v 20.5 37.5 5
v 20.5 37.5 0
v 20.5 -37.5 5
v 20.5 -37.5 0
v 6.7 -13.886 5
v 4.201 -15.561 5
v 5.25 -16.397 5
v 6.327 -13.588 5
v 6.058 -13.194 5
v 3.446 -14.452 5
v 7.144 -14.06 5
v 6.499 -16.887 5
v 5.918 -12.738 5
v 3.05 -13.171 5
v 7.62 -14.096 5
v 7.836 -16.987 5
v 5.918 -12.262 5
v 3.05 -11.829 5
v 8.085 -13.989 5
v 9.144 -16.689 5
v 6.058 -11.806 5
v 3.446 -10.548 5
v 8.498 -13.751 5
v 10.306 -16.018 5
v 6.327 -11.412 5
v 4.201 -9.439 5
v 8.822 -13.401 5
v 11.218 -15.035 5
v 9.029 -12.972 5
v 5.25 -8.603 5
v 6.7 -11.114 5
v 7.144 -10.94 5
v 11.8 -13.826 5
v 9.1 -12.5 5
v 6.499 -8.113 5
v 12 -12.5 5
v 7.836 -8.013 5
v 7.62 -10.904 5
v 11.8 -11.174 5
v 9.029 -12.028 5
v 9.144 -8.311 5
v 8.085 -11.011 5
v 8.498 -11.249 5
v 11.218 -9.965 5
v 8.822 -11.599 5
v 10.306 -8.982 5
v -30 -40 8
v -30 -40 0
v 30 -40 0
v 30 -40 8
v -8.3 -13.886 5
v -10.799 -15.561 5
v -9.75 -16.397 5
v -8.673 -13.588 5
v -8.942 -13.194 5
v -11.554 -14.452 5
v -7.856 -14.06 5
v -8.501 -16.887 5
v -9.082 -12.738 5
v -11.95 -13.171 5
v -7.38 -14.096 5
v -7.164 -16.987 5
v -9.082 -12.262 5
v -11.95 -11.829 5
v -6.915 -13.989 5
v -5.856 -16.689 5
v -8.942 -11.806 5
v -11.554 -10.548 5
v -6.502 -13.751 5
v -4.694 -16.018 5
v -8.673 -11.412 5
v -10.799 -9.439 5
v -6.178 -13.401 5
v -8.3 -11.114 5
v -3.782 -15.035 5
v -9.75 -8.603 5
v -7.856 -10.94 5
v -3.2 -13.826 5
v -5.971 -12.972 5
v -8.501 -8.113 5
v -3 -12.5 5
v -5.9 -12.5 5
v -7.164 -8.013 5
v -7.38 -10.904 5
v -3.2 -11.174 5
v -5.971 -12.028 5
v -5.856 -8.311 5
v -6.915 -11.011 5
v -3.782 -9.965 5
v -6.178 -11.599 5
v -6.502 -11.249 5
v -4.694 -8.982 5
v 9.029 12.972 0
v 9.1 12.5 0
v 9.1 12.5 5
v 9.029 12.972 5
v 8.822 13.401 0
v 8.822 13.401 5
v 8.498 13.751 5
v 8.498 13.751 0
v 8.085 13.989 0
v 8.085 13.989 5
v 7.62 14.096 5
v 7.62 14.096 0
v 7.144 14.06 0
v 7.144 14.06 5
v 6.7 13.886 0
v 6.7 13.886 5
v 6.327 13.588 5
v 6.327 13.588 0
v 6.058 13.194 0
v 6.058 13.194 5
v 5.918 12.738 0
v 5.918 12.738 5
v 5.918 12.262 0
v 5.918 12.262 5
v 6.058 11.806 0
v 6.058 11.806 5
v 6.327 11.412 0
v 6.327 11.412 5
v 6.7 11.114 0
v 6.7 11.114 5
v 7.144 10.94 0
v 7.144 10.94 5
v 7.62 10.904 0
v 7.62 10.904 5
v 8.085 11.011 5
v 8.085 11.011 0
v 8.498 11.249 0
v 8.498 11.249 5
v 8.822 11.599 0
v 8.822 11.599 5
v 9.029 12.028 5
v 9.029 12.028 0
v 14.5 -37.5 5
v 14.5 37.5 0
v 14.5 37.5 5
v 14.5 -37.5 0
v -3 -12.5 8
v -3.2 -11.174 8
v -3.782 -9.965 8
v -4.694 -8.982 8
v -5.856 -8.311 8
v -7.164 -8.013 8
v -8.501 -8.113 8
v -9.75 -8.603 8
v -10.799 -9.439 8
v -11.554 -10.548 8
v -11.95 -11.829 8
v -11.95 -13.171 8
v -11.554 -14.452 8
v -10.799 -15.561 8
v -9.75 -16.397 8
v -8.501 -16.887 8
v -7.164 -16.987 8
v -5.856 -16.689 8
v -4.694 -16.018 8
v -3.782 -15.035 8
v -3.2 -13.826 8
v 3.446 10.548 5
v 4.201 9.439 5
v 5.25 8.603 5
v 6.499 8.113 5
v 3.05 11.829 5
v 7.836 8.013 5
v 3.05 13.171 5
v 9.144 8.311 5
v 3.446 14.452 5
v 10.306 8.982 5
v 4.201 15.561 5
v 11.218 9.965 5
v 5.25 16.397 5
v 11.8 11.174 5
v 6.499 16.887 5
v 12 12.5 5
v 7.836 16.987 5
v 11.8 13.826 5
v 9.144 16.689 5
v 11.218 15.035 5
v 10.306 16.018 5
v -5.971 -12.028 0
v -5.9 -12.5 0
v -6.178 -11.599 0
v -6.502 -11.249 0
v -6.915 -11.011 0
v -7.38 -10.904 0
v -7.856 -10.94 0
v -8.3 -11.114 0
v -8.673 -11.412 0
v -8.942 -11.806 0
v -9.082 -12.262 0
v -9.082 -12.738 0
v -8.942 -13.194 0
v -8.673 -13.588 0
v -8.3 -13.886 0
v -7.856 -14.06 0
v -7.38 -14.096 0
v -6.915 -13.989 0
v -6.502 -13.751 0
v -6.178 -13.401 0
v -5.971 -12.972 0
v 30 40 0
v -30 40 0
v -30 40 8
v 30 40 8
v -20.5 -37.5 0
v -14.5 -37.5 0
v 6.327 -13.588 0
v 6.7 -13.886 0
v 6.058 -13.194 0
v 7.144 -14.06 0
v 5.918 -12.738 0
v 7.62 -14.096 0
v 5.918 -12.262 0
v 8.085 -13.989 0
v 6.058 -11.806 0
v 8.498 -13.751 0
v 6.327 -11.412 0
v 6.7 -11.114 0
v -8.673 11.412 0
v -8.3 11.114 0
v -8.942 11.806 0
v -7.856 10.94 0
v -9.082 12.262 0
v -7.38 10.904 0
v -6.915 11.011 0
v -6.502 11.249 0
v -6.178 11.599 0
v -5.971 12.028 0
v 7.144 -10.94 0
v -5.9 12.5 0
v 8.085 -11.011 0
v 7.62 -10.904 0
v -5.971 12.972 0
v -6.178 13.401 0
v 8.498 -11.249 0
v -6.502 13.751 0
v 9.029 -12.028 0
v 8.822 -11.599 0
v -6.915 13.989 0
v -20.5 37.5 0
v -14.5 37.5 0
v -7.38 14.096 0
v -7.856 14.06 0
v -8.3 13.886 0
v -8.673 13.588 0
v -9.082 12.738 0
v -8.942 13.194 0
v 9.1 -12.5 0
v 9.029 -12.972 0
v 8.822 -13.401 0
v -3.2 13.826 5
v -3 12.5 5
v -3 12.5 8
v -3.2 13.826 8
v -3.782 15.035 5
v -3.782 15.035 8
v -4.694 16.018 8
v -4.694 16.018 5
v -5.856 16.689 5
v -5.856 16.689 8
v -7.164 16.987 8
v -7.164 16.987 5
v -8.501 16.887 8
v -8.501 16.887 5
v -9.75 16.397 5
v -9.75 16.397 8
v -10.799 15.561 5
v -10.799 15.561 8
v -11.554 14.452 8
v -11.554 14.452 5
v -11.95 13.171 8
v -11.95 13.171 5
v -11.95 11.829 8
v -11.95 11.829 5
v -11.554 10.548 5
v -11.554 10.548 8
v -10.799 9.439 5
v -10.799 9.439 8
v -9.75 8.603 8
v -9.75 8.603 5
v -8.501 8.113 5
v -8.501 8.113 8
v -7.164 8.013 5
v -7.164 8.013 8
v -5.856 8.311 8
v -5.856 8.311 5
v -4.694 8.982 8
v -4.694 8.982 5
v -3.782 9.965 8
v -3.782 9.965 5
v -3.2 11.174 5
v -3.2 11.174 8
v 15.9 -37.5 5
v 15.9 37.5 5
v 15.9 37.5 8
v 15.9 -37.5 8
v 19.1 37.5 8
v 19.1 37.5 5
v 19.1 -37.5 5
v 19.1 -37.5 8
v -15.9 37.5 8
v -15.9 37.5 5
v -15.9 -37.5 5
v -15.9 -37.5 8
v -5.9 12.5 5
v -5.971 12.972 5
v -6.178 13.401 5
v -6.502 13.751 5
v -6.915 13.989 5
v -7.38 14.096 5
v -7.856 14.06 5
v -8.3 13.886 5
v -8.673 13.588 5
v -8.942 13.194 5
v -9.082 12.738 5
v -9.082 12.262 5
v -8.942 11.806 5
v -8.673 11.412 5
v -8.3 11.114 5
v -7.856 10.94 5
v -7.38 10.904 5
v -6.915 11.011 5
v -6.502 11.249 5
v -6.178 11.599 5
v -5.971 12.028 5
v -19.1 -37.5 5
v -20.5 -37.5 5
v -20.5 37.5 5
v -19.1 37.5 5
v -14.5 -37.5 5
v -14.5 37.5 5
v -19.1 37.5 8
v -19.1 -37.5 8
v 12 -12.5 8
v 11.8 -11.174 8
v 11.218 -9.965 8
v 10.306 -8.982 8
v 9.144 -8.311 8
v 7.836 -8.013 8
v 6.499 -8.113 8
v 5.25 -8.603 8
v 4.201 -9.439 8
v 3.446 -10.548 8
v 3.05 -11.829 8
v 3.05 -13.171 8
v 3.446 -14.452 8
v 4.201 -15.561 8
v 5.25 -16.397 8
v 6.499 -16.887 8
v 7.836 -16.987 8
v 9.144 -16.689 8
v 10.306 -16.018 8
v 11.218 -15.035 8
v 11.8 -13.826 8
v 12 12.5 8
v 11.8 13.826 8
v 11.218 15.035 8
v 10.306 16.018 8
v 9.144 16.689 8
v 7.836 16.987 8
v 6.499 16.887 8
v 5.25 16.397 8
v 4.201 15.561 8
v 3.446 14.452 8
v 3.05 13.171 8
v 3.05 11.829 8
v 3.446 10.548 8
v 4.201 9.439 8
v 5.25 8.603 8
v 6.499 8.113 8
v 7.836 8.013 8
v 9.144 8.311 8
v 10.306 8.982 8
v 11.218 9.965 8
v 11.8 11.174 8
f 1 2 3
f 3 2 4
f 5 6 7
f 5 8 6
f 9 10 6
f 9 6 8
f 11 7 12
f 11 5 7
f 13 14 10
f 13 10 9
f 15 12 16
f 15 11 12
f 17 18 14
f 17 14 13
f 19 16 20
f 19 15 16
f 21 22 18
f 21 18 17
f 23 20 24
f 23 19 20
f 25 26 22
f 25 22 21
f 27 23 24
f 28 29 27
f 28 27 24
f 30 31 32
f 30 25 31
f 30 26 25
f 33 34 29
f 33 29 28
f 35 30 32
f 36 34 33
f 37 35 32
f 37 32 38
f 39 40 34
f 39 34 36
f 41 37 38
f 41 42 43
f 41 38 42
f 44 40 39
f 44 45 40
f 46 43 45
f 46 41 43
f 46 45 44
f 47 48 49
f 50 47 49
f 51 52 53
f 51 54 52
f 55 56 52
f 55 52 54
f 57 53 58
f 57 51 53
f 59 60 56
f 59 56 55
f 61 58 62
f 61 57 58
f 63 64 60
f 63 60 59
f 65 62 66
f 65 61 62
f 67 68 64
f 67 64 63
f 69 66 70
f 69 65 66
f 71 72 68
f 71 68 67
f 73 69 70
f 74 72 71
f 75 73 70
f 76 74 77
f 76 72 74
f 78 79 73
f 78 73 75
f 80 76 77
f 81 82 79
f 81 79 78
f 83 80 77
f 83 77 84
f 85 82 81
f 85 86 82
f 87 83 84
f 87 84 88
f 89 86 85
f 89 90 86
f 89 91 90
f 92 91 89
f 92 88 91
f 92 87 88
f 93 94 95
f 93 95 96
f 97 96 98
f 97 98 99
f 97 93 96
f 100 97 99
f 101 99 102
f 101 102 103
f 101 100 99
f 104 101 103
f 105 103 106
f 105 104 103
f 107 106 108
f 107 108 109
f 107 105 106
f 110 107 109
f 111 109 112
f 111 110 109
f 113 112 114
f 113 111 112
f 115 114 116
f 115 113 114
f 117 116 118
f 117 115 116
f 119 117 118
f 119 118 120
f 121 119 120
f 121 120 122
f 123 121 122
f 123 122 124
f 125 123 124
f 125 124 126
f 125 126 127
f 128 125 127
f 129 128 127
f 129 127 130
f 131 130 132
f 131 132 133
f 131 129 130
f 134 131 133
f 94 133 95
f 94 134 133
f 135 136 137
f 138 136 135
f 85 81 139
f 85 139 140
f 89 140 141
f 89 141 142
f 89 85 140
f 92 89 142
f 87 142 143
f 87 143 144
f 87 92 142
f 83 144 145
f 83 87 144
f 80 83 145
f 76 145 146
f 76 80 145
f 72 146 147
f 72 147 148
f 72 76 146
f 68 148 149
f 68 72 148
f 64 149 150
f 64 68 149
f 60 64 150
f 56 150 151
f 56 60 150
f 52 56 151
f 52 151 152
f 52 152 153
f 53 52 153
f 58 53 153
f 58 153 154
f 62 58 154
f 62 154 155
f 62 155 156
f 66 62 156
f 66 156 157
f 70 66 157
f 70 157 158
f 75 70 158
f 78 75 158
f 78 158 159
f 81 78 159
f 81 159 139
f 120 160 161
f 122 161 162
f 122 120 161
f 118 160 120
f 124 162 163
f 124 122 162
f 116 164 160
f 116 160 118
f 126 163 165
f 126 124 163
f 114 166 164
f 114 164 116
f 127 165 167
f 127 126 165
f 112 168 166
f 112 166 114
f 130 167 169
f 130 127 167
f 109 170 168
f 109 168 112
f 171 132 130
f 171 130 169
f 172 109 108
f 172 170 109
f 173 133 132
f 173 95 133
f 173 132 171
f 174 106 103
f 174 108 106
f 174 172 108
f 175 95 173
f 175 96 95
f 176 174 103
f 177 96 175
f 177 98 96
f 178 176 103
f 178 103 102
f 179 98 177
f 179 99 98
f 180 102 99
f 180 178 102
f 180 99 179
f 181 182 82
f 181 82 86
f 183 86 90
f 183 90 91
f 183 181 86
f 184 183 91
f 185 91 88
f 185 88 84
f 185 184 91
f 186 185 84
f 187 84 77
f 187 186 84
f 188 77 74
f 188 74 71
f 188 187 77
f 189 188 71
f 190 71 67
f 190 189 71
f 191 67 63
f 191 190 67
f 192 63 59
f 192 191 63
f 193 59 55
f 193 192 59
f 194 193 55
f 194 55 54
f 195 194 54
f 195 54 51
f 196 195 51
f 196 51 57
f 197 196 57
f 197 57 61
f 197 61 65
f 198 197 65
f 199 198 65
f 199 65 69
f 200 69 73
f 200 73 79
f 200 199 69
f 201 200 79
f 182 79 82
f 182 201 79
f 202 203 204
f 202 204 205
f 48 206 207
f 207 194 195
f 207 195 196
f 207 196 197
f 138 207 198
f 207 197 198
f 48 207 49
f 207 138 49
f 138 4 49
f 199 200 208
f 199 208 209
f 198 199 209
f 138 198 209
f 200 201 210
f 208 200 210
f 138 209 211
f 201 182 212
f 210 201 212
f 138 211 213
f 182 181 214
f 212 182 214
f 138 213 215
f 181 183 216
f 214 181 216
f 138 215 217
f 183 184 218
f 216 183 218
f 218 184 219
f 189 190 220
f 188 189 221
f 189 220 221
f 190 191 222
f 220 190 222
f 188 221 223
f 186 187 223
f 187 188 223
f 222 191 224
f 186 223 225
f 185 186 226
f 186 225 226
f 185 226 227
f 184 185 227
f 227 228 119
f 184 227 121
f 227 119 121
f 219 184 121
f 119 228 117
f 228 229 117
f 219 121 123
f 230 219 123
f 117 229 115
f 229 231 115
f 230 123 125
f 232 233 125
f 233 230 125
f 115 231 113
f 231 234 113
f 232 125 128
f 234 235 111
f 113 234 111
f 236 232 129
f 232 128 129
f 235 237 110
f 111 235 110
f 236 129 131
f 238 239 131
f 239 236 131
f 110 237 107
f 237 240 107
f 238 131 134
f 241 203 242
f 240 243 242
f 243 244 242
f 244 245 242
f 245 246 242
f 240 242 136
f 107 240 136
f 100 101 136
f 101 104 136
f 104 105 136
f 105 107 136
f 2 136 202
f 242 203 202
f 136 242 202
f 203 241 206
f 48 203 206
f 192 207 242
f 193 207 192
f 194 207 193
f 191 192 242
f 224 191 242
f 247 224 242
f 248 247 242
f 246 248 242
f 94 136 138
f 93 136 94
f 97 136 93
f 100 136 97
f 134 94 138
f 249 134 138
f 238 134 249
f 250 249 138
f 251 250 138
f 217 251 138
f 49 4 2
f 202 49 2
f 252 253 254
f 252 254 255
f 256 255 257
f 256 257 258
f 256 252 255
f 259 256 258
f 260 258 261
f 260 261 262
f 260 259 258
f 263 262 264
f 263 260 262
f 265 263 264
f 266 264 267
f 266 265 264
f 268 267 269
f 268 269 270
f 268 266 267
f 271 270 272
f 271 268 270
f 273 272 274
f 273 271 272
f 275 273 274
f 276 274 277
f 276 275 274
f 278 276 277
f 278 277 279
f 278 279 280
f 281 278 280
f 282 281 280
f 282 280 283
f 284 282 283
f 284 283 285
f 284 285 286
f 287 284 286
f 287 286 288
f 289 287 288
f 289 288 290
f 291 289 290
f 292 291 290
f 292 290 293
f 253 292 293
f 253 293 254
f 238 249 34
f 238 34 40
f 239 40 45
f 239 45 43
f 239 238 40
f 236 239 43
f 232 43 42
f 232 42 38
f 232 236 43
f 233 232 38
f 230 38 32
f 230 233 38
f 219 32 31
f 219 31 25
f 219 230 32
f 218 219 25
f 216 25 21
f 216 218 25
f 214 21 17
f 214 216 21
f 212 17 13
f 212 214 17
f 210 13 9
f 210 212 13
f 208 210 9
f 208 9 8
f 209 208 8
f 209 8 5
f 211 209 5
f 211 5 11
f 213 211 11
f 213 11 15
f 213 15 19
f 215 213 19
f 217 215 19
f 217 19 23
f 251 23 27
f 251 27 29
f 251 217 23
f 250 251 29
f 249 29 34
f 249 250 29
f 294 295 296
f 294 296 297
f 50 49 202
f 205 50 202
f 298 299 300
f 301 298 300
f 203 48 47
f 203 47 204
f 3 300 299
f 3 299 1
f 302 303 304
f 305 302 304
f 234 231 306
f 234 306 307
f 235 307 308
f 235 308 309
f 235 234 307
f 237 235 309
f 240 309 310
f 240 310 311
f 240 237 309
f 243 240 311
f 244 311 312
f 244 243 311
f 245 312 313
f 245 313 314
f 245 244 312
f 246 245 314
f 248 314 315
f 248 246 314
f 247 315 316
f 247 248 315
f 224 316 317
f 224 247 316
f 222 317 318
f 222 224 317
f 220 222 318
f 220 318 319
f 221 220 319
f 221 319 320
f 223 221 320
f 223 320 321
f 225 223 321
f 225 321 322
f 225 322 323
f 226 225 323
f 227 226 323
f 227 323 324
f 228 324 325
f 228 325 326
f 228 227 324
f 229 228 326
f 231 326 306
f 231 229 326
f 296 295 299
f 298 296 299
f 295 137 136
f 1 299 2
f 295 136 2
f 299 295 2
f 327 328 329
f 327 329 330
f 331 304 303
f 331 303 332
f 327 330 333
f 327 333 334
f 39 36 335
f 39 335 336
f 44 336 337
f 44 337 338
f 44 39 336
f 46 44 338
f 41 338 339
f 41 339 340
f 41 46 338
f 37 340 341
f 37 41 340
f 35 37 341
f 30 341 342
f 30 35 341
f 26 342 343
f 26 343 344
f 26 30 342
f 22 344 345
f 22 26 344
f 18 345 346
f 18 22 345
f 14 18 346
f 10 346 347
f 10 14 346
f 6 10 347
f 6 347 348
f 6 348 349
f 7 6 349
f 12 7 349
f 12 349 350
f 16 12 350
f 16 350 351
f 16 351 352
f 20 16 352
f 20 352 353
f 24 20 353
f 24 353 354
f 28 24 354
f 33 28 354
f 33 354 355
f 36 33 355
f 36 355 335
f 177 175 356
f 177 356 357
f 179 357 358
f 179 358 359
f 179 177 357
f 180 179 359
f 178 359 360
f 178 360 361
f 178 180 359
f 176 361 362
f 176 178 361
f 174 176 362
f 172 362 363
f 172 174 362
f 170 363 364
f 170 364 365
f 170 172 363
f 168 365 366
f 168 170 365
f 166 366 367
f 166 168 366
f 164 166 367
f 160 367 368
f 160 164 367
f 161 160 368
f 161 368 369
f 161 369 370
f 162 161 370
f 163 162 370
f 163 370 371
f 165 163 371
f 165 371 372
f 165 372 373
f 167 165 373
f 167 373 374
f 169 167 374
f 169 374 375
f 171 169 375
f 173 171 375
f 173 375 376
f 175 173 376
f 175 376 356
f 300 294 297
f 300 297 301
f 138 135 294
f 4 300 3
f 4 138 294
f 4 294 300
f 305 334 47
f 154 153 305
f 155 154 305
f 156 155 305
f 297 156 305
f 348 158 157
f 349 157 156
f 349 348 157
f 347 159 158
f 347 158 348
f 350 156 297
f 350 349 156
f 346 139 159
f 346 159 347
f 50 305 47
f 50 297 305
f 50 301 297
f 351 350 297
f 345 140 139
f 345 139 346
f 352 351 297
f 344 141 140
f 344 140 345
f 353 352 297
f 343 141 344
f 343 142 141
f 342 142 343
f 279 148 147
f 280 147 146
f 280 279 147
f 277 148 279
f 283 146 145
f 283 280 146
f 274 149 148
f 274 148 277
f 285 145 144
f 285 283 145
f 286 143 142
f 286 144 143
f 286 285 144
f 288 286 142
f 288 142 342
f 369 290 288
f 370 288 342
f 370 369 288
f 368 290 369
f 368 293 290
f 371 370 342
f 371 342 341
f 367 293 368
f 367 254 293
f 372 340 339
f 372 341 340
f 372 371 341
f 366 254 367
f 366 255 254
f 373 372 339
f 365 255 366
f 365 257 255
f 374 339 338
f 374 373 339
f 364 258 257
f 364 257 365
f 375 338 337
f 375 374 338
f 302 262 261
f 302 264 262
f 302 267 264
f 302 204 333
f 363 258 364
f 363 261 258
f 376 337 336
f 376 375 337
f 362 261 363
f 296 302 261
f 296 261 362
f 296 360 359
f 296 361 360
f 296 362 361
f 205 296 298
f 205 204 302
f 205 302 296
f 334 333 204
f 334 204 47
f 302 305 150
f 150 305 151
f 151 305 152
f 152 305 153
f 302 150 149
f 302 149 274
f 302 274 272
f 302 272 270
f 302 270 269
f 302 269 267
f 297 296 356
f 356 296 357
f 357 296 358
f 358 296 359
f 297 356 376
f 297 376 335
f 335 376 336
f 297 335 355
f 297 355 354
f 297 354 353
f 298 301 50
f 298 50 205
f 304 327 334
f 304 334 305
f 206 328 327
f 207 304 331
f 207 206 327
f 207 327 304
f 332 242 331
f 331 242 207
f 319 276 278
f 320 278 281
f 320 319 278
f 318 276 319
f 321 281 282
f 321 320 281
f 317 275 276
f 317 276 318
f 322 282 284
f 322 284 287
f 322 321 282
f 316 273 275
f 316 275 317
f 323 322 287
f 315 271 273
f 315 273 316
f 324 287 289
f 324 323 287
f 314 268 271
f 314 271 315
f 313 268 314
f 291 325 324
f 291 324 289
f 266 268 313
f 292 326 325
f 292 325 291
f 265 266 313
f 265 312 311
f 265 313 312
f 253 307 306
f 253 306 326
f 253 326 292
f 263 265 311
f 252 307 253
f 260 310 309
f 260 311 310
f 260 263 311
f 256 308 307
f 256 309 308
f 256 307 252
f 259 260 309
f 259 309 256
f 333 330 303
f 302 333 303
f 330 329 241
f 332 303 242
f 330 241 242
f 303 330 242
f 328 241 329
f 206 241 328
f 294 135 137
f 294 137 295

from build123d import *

# Parameters (mm, degrees)
F0_W     = 60
F0_H     = 80
F0_R     = 4.5
F1_DEPTH = 8
F0_R_2   = 1.6
F2_DEPTH = 5
F3_W     = 1.4
F3_H     = 75
F4_DEPTH = 5
F3_W_2   = 1.6
F3_W_3   = 3.2
F5_DEPTH = 25


with BuildPart() as f1:
    # F0 (on Top) → F1 (new body)
    with BuildSketch(Plane.XY):
        Rectangle(F0_W, F0_H)
        with Locations((-7.5, -12.5)):
            Circle(F0_R, mode=Mode.SUBTRACT)
        with Locations((7.5, -12.5)):
            Circle(F0_R, mode=Mode.SUBTRACT)
        with Locations((-7.5, 12.5)):
            Circle(F0_R, mode=Mode.SUBTRACT)
        with Locations((7.5, 12.5)):
            Circle(F0_R, mode=Mode.SUBTRACT)
    extrude(amount=F1_DEPTH)

    # F0 (on Top) → F2 (join)
    with BuildSketch(Plane.XY):
        with Locations((-7.5, 12.5)):
            Circle(F0_R)
        with Locations((-7.5, 12.5)):
            Circle(F0_R_2, mode=Mode.SUBTRACT)
        with Locations((-7.5, -12.5)):
            Circle(F0_R)
        with Locations((-7.5, -12.5)):
            Circle(F0_R_2, mode=Mode.SUBTRACT)
        with Locations((7.5, -12.5)):
            Circle(F0_R)
        with Locations((7.5, -12.5)):
            Circle(F0_R_2, mode=Mode.SUBTRACT)
        with Locations((7.5, 12.5)):
            Circle(F0_R)
        with Locations((7.5, 12.5)):
            Circle(F0_R_2, mode=Mode.SUBTRACT)
    extrude(amount=F2_DEPTH)

    # F3 (on face) → F4 (cut)
    with BuildSketch(Plane(origin=(0, 0, 0), x_dir=(1, 0, 0), z_dir=(0, 0, -1))):
        with Locations((-19.8, 0)):
            Rectangle(F3_W, F3_H)
        with Locations((-15.2, 0)):
            Rectangle(F3_W, F3_H)
        with Locations((15.2, 0)):
            Rectangle(F3_W, F3_H)
        with Locations((19.8, 0)):
            Rectangle(F3_W, F3_H)
    extrude(amount=-F4_DEPTH, mode=Mode.SUBTRACT)

    # F3 (on face) → F5 (cut)
    with BuildSketch(Plane(origin=(0, 0, 0), x_dir=(1, 0, 0), z_dir=(0, 0, -1))):
        with Locations((-18.3, 0)):
            Rectangle(F3_W_2, F3_H)
        with Locations((-16.7, 0)):
            Rectangle(F3_W_2, F3_H)
        with Locations((17.5, 0)):
            Rectangle(F3_W_3, F3_H)
    extrude(amount=-F5_DEPTH, mode=Mode.SUBTRACT)


solid = f1.part
